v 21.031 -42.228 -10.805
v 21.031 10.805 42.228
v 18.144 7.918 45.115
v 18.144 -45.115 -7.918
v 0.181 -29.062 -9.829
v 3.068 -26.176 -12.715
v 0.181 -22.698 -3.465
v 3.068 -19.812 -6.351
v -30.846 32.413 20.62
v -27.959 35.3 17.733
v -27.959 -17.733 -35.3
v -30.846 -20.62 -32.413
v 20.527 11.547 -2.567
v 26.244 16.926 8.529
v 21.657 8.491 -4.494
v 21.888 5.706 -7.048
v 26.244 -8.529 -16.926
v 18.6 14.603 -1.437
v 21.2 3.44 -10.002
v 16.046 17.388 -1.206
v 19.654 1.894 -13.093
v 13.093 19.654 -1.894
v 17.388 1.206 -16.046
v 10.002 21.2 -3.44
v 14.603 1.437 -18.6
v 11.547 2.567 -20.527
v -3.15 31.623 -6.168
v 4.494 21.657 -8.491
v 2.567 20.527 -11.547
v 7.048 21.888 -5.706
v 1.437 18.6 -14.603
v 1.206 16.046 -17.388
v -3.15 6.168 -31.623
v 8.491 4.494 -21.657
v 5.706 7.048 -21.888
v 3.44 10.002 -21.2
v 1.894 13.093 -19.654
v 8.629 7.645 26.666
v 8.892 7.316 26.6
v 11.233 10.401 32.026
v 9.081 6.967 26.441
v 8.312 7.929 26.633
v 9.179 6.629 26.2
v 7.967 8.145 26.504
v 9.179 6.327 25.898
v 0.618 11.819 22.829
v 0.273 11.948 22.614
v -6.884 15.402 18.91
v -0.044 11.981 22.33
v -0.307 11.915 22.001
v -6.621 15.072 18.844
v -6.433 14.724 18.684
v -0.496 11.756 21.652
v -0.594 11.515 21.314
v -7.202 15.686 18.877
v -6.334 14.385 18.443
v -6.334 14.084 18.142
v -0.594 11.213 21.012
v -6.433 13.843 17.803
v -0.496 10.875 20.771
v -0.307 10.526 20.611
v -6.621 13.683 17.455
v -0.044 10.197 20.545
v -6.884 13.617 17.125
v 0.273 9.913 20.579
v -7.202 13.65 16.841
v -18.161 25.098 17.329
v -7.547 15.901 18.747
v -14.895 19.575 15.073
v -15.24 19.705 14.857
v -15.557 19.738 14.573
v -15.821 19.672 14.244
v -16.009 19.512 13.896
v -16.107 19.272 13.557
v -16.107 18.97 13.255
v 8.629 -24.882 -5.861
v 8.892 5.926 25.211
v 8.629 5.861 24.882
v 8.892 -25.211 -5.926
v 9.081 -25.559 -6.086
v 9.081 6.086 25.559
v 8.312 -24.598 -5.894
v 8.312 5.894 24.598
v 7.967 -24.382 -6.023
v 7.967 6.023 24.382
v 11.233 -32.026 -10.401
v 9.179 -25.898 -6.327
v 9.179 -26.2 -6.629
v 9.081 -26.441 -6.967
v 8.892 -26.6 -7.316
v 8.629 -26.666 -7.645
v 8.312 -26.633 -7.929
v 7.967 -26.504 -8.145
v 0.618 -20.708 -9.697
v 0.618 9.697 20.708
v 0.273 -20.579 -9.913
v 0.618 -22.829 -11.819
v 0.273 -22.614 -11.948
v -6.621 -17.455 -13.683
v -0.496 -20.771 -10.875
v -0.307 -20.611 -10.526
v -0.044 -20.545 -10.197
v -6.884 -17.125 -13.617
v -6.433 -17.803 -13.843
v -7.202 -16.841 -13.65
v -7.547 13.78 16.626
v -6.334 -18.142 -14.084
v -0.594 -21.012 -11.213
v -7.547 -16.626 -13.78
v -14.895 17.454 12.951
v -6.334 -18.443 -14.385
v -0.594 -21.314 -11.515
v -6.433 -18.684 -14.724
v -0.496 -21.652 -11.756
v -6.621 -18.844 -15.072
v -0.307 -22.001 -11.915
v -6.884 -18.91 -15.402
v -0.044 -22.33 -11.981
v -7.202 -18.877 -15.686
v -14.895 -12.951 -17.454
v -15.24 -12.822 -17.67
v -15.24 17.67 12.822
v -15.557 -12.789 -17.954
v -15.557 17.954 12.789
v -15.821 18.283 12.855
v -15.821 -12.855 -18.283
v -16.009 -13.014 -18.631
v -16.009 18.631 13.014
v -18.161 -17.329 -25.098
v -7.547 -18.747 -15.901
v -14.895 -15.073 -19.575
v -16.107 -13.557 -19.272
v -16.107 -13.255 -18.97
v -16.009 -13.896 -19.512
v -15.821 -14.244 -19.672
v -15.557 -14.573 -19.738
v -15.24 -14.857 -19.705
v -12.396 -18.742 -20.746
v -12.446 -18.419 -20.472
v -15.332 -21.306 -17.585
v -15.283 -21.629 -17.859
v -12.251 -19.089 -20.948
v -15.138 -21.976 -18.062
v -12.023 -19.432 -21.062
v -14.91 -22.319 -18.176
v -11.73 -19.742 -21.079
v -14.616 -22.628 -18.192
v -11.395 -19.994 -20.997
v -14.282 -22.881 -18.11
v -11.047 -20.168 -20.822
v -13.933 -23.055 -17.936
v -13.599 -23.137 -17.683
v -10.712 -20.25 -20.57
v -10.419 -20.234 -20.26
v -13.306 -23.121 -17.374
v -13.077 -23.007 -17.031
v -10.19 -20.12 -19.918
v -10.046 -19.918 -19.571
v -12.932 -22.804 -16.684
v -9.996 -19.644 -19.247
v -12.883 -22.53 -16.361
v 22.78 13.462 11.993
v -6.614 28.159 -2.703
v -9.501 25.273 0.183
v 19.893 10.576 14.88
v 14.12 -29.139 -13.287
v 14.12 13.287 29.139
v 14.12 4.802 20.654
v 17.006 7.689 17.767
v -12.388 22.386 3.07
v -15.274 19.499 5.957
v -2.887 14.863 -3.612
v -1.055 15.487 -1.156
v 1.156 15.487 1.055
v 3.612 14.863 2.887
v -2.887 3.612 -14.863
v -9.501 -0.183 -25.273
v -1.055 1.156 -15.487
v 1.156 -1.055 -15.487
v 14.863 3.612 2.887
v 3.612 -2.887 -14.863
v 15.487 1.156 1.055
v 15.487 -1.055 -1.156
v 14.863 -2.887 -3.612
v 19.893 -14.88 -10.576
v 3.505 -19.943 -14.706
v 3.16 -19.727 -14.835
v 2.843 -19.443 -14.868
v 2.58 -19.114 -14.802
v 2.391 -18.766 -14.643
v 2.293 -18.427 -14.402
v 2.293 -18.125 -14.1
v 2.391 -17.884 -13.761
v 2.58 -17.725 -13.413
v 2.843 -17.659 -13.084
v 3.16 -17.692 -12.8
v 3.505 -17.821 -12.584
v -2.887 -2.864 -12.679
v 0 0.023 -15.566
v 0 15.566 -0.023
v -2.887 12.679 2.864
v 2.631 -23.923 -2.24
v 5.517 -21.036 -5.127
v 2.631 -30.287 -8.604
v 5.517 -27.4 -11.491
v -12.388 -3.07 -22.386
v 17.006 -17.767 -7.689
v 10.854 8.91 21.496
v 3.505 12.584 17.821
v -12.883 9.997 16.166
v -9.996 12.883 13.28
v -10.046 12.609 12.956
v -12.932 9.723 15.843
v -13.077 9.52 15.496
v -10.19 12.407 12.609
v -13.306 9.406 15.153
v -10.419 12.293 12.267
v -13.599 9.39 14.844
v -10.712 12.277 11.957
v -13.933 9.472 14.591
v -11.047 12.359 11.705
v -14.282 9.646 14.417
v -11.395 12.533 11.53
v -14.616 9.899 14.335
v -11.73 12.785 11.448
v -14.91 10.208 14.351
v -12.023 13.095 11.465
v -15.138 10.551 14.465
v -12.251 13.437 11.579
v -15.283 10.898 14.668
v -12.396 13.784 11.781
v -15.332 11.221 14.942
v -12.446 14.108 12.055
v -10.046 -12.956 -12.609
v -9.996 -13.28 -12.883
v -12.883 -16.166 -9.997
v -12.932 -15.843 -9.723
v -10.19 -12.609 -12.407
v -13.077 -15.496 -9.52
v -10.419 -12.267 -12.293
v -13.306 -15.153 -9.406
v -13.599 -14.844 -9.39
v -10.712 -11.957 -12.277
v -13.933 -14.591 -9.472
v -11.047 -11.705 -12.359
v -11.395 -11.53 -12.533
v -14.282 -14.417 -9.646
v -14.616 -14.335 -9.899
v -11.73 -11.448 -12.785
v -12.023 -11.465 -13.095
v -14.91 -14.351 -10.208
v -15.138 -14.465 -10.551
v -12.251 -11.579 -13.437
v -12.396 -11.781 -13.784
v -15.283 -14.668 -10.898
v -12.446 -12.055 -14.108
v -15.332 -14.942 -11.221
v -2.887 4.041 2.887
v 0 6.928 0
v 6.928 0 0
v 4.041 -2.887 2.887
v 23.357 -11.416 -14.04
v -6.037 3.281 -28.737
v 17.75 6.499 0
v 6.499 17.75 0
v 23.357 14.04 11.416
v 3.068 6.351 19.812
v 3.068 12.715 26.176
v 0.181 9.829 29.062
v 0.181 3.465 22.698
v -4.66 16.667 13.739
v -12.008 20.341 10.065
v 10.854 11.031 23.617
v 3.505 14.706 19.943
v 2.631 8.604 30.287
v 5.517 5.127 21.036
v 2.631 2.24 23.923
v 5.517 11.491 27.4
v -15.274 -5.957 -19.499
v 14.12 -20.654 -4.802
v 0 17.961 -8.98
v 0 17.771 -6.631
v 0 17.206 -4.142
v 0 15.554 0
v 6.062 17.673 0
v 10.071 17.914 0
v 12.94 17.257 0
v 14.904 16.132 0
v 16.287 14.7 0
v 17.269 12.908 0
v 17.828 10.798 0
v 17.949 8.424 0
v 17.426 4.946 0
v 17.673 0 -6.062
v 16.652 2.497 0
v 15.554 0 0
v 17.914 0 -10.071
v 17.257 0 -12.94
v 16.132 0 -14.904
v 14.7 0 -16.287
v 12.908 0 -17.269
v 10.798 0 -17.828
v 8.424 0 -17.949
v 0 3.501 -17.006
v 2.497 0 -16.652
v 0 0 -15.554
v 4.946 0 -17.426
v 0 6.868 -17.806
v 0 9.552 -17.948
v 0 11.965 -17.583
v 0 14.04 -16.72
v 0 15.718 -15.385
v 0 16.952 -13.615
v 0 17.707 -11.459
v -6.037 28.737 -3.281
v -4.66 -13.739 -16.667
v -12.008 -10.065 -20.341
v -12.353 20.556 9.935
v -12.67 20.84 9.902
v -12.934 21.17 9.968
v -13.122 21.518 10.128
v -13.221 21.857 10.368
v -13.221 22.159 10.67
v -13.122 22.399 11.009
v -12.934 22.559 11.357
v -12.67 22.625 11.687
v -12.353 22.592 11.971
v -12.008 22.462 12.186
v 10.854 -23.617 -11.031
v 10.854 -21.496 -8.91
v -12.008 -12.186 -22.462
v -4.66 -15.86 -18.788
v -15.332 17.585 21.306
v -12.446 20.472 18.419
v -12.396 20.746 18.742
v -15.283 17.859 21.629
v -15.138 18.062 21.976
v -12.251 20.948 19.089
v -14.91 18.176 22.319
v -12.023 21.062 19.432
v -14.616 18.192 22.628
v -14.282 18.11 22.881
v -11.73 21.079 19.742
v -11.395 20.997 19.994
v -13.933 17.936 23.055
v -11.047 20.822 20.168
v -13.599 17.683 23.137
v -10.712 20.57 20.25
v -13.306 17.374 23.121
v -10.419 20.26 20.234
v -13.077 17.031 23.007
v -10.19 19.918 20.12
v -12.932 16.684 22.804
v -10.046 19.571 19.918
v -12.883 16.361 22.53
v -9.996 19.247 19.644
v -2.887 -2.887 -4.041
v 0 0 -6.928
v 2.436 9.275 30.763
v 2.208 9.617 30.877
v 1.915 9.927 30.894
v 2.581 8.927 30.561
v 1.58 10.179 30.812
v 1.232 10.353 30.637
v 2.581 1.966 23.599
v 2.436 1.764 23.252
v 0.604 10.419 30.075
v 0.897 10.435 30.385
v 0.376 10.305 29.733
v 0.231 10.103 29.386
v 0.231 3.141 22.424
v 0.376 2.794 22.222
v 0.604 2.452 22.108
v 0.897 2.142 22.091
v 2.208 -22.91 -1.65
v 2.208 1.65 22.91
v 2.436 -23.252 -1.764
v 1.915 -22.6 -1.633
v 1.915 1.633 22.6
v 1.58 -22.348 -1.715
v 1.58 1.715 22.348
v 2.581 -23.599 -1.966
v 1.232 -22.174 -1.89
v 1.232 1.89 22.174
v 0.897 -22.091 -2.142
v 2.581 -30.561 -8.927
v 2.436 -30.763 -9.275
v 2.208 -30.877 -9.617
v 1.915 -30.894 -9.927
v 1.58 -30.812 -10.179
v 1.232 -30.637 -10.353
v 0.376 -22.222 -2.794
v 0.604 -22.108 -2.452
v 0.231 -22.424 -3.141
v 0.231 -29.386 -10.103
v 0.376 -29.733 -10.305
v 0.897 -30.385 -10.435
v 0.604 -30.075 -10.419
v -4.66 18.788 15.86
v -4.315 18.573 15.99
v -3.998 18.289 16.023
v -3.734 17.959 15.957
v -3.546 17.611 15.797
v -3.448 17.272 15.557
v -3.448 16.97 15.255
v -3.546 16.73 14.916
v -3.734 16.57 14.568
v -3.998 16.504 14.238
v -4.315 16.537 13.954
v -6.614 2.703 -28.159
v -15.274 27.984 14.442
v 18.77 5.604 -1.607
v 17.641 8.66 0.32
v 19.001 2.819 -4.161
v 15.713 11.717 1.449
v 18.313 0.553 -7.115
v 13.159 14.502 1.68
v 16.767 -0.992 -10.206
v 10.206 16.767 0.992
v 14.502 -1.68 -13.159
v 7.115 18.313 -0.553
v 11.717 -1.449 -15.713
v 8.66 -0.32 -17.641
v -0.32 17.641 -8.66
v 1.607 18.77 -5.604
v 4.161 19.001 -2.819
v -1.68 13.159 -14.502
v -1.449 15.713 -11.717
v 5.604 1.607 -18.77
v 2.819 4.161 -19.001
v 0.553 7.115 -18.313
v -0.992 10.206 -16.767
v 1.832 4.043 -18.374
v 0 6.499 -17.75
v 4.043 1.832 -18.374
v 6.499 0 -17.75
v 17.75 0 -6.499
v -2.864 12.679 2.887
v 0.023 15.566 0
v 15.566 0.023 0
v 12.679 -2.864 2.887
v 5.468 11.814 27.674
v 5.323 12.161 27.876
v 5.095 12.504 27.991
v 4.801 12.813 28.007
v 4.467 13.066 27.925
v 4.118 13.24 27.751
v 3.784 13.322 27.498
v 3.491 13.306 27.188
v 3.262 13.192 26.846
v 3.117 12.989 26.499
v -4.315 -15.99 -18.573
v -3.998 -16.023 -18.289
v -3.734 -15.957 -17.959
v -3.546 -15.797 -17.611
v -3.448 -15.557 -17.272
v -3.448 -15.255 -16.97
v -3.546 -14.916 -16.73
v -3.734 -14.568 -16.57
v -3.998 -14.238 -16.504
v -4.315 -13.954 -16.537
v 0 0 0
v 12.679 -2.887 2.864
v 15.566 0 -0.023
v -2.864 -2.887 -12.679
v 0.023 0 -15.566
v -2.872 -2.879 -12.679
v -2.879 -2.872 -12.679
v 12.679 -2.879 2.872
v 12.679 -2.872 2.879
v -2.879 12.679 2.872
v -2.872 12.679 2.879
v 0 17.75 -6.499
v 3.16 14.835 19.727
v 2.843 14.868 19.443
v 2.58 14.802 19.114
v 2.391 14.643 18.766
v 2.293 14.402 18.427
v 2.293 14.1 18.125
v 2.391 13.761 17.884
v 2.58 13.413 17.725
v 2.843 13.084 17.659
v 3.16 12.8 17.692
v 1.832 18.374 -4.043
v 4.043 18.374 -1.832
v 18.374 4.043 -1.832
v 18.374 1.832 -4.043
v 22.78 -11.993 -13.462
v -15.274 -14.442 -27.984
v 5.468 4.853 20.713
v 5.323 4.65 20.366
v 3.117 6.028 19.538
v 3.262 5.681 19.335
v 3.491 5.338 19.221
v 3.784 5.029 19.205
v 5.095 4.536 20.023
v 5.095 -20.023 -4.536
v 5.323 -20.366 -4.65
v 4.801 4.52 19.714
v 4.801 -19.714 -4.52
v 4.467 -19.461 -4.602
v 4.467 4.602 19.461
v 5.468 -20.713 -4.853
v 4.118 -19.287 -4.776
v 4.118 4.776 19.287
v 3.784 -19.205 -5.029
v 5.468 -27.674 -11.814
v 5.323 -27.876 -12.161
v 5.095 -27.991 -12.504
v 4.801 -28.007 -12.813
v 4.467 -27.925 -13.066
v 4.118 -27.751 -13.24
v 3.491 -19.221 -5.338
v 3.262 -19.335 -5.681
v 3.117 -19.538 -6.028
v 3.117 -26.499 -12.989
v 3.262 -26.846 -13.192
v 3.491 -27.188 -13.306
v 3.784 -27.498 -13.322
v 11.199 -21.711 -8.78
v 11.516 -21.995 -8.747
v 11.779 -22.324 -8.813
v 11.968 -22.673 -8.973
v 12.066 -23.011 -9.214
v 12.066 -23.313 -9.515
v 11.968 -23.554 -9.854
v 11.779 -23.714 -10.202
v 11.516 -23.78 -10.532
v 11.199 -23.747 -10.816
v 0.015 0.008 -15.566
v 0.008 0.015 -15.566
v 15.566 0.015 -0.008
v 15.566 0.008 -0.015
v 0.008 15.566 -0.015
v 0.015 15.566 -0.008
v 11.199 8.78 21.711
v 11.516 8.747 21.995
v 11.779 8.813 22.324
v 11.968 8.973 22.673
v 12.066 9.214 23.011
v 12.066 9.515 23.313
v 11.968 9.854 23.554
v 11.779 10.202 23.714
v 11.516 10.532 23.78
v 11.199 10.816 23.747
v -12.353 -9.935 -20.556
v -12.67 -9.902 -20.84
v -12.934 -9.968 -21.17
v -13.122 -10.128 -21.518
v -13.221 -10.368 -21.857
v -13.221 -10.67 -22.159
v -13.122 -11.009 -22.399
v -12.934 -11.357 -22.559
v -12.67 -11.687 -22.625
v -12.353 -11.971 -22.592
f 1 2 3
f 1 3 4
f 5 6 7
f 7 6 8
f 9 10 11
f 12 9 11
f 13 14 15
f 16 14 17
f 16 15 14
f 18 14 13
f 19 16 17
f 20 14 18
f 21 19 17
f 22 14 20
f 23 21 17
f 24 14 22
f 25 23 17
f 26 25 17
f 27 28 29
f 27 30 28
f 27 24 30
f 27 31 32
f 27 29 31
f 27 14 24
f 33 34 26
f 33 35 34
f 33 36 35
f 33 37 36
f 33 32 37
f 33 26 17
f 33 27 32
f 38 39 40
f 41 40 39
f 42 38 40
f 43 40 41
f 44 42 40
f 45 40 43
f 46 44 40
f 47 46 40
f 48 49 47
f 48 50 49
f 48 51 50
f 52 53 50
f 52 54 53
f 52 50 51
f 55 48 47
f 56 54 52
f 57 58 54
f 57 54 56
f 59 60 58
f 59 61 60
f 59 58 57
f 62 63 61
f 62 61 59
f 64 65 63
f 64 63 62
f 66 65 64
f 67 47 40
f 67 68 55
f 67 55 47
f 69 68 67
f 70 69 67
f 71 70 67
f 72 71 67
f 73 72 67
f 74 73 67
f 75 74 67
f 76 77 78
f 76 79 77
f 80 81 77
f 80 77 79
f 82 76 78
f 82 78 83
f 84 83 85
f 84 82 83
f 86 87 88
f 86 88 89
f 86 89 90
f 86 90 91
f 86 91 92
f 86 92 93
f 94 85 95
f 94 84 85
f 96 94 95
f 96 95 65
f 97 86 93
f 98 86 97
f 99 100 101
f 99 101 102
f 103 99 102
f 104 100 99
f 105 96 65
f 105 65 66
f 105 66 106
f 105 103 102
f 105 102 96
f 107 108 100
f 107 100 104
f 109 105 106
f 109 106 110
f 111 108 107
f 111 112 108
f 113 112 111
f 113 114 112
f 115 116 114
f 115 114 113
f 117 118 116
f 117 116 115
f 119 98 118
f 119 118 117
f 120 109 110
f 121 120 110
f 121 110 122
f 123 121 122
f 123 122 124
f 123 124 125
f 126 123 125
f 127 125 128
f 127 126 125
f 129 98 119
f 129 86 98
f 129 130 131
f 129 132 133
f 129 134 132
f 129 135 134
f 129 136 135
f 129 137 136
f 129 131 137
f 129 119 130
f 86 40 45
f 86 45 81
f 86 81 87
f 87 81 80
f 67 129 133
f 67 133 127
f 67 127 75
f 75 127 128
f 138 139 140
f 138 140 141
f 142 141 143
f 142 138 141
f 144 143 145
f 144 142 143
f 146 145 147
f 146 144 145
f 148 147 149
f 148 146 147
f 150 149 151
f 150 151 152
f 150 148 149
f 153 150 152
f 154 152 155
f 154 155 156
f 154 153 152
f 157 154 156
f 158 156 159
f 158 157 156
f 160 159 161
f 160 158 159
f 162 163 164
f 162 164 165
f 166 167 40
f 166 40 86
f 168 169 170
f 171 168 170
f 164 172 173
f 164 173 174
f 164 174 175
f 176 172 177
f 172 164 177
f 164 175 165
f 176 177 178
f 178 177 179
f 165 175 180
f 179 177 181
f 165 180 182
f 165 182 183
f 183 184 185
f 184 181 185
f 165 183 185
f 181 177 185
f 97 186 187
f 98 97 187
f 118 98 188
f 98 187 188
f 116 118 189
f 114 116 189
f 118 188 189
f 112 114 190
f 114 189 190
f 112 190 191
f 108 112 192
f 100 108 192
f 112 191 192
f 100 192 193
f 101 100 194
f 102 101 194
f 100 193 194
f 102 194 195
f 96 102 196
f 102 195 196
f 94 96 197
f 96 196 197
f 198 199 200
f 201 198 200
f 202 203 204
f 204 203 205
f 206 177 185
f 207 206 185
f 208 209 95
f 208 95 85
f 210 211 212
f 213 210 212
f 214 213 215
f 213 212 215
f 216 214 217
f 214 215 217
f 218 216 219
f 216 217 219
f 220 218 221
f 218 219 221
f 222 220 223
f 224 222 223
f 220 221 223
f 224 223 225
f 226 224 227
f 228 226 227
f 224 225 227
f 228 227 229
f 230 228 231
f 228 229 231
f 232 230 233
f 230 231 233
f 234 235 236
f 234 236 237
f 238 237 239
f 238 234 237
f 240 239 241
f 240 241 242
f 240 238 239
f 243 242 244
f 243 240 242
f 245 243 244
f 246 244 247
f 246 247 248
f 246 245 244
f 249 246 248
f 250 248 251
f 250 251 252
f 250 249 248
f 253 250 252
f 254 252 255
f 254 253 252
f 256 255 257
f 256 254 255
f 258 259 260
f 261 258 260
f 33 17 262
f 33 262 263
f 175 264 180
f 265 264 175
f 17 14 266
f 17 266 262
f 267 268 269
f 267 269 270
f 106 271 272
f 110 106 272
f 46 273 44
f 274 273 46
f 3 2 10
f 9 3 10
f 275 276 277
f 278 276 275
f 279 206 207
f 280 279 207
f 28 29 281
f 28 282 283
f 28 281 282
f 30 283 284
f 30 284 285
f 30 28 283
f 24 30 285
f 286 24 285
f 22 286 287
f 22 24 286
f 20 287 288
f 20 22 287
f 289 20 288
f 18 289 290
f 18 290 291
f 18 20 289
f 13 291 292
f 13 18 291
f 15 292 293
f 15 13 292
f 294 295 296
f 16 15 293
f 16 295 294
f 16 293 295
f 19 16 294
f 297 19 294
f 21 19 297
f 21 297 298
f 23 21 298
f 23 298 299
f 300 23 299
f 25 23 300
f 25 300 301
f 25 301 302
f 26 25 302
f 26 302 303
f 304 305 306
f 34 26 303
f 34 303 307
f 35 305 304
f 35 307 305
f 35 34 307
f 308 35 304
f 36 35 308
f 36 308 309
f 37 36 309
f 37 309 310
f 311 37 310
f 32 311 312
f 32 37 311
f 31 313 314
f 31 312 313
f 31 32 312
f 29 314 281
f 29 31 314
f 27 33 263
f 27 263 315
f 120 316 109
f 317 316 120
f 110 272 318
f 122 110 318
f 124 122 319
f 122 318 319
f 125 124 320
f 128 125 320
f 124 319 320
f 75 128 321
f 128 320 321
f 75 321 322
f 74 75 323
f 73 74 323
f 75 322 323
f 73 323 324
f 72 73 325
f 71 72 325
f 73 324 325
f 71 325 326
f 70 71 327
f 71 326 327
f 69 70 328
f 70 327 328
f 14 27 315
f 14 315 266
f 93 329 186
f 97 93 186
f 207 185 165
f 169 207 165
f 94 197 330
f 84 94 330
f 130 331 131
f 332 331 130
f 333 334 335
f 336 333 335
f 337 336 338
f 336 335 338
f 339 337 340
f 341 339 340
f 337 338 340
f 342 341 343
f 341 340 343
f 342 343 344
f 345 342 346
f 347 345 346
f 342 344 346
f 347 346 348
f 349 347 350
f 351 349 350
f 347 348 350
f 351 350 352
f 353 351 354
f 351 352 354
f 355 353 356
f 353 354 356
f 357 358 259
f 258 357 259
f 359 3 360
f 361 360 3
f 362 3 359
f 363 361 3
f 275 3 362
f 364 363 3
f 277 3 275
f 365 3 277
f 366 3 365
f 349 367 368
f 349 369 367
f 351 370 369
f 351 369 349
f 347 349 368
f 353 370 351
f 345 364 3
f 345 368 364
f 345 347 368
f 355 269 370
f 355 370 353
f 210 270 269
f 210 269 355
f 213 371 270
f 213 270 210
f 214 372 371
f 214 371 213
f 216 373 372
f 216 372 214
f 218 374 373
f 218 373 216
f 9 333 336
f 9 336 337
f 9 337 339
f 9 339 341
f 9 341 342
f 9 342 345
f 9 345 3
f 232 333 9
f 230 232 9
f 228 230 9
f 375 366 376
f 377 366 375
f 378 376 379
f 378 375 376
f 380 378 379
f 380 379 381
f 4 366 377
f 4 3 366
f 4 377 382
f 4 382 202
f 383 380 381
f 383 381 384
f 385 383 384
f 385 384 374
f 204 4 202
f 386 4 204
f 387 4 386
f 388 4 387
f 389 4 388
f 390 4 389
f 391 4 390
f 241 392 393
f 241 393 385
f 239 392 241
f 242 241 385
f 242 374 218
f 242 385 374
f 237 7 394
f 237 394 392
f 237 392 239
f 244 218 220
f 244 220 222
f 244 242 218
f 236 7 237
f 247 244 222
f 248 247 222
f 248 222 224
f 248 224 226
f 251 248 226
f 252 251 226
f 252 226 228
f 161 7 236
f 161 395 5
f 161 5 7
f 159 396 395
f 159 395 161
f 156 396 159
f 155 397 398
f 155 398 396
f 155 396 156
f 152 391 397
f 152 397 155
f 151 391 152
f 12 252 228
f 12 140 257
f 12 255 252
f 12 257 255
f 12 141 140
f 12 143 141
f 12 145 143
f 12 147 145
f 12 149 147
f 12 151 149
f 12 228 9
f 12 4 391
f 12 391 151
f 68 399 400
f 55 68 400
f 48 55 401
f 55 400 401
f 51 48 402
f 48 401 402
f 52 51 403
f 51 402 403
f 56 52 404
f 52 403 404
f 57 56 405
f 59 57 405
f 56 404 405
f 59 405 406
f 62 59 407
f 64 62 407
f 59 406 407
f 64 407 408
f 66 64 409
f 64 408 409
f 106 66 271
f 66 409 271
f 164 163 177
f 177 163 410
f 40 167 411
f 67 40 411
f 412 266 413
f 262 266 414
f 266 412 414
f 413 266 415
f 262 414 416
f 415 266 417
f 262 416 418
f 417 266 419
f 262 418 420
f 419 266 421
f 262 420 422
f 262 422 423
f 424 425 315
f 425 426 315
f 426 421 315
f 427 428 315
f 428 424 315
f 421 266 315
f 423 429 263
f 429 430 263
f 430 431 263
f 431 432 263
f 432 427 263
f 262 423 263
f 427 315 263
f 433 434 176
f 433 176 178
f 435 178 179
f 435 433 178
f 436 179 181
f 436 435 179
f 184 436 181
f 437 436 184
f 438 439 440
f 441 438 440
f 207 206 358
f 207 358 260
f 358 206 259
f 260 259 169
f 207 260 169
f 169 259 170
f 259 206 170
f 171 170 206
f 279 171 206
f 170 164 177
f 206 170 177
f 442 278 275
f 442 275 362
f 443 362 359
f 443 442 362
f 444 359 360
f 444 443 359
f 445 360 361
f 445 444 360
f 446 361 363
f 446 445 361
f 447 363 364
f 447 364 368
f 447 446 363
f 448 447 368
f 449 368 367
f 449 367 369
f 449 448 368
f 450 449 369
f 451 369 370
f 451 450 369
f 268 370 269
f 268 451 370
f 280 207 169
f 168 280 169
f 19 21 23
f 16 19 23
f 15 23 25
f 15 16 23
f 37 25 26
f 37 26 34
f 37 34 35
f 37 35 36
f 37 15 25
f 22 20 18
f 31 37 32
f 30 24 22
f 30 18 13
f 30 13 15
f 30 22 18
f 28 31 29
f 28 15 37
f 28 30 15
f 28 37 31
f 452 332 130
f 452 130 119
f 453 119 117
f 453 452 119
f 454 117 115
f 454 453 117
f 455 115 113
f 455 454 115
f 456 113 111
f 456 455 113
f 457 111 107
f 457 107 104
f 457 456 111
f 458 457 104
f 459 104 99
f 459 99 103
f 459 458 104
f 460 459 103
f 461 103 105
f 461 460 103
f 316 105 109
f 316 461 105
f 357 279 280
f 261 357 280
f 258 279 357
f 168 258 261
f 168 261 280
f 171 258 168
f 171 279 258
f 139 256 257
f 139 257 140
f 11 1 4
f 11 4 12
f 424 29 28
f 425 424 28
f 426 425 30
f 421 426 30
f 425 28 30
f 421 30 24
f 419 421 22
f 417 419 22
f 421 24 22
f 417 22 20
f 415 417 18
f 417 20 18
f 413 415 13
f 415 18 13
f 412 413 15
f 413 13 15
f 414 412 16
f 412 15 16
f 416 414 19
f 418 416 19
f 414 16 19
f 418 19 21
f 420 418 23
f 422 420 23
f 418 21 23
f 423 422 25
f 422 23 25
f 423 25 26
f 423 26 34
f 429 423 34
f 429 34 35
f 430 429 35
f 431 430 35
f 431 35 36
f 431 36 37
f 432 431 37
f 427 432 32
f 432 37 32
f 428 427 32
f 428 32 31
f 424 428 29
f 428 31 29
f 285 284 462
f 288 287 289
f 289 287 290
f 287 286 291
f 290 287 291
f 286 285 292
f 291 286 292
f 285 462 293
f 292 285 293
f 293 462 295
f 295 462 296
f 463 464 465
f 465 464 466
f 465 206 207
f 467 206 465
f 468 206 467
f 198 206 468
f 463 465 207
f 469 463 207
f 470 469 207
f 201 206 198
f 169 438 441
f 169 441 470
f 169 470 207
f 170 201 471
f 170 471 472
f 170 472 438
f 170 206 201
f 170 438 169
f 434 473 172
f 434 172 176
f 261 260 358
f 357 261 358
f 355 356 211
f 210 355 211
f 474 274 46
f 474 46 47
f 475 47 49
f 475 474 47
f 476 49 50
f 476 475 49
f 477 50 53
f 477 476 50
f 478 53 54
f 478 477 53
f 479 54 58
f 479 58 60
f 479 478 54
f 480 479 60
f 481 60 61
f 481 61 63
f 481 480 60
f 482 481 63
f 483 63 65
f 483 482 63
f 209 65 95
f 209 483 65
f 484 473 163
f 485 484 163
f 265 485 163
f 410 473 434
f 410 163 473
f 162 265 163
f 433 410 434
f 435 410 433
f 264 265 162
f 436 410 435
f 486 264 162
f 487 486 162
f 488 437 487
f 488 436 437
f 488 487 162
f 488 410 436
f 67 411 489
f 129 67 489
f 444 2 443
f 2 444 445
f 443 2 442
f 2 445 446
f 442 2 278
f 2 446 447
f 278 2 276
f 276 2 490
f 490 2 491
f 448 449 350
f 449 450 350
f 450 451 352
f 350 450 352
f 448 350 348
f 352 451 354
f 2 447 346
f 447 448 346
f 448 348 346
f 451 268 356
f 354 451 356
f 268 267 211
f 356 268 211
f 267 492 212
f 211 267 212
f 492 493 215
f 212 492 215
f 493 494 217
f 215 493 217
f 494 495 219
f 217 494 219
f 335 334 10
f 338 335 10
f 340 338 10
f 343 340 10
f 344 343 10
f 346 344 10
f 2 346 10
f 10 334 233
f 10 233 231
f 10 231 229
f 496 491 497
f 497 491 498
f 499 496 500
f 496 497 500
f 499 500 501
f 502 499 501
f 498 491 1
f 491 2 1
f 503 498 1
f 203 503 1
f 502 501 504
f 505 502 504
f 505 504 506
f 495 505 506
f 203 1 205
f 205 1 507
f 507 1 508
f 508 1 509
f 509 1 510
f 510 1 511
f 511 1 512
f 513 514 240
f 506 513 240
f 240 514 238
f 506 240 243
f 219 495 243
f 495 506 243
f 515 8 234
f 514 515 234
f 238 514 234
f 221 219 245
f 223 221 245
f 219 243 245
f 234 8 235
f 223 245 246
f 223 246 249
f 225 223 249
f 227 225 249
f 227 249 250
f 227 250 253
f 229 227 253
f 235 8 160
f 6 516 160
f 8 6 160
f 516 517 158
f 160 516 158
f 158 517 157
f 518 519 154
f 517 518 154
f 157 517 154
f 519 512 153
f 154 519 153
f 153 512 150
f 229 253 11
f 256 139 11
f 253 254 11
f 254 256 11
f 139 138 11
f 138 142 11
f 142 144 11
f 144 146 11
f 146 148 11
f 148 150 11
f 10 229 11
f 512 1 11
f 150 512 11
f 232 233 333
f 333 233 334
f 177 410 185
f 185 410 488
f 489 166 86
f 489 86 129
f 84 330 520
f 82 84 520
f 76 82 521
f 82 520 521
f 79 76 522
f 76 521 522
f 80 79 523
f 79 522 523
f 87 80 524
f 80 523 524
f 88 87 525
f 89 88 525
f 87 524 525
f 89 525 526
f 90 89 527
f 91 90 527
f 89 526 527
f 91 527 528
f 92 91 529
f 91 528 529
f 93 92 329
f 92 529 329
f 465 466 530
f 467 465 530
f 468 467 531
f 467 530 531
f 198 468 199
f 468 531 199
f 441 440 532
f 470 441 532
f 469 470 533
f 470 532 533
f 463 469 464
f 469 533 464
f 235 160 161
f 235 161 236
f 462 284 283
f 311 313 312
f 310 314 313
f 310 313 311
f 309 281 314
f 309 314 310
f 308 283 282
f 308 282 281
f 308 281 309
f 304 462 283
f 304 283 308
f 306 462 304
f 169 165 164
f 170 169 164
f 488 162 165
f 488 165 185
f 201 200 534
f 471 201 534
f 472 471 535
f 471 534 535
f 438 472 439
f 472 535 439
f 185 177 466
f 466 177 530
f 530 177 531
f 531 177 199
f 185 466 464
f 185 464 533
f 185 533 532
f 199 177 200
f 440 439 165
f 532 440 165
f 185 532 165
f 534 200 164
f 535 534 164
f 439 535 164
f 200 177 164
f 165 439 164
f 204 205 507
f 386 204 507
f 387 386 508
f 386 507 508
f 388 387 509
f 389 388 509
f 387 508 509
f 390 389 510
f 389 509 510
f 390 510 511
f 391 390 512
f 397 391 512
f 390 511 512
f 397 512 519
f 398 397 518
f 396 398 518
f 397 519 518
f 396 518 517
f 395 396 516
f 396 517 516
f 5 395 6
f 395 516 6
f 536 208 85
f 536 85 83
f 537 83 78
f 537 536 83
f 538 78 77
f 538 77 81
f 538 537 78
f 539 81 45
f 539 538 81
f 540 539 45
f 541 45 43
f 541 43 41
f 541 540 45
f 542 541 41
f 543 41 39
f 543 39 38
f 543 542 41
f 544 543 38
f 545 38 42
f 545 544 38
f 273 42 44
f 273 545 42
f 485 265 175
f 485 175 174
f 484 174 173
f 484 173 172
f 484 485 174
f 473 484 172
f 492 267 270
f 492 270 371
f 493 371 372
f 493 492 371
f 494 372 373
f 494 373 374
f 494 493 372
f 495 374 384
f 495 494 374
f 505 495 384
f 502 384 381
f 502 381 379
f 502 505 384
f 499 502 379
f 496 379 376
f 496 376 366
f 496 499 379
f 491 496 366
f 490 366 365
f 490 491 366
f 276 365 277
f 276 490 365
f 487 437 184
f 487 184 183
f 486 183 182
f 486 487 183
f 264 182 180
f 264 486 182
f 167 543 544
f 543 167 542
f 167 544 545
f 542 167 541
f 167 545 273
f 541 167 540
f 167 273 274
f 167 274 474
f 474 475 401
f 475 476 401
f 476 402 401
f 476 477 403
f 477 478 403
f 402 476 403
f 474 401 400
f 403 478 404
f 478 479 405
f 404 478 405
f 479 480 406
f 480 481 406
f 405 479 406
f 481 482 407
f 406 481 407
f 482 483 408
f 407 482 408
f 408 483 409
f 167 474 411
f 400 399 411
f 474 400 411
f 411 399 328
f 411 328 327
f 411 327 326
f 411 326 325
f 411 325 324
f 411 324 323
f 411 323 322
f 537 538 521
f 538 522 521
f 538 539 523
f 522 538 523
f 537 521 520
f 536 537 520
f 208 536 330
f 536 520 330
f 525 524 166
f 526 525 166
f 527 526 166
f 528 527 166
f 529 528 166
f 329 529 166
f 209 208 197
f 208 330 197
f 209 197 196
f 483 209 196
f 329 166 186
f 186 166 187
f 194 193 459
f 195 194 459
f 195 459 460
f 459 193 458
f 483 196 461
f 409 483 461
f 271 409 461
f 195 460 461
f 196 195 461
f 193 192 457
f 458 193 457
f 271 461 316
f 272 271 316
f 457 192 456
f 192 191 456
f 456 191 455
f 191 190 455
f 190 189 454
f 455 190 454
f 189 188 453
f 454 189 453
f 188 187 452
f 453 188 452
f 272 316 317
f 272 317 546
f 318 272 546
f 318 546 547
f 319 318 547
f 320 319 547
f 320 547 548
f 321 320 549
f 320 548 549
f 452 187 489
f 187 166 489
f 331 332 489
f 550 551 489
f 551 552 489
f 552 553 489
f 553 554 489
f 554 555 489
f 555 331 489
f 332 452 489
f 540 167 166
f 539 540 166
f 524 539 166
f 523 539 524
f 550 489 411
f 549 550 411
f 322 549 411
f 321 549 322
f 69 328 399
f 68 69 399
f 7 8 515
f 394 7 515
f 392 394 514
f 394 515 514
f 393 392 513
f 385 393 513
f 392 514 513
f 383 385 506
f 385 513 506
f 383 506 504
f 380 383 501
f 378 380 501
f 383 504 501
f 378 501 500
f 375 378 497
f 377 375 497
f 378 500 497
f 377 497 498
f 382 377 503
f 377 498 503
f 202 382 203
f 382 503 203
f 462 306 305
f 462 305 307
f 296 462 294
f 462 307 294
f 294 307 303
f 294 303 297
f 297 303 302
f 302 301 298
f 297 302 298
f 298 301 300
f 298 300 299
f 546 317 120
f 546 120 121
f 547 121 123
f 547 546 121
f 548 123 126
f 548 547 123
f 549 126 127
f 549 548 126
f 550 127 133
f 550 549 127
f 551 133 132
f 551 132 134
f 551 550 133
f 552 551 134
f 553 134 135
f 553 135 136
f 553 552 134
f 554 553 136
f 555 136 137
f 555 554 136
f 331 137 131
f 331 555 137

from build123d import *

# Parameters (mm, degrees)
SKETCH1_W           = 80
SKETCH1_H           = 80
BOSS_EXTRUDE1_DEPTH = 80
SKETCH2_R           = 97.950709898
CUT_EXTRUDE1_DEPTH  = 93.37604307
SKETCH3_R           = 78.302577254
SKETCH3_R_2         = 12.7
CUT_EXTRUDE2_DEPTH  = 40
SKETCH4_R           = 14.105721121
CUT_EXTRUDE3_DEPTH  = 40
SKETCH6_W           = 36
SKETCH6_H           = 36
BOSS_EXTRUDE2_DEPTH = 5
BOSS_EXTRUDE3_DEPTH = 5
BOSS_EXTRUDE4_DEPTH = 5
SKETCH12_R          = 12.7
BOSS_EXTRUDE6_DEPTH = 5
SKETCH15_W          = 36
SKETCH15_H          = 60
BOSS_EXTRUDE8_DEPTH = 5
SKETCH16_W          = 60
SKETCH16_H          = 75
BOSS_EXTRUDE9_DEPTH = 5


with BuildPart() as part:
    # Sketch1 → Boss-Extrude1 (new body)
    with BuildSketch(Plane(origin=(0, 0, 0), x_dir=(1, 0, 0), z_dir=(0, 1, 0))):
        with Locations((40, 40)):
            Rectangle(SKETCH1_W, SKETCH1_H)
    extrude(amount=BOSS_EXTRUDE1_DEPTH)

    # Sketch2 → Cut-Extrude1 (cut, through all)
    with BuildSketch(Plane(origin=(26.666666667, 26.666666667, -26.666666667), x_dir=(-0.8164965809277261, 0.408248290463863, -0.408248290463863), z_dir=(0.5773502691896257, 0.5773502691896258, -0.5773502691896258))):
        Circle(SKETCH2_R)
    extrude(amount=CUT_EXTRUDE1_DEPTH, mode=Mode.SUBTRACT)

    # Sketch3 → Cut-Extrude2 (cut)
    with BuildSketch(Plane(origin=(26.666666667, 26.666666667, -26.666666667), x_dir=(-0.4082482904638628, -0.408248290463863, -0.8164965809277263), z_dir=(0.5773502691896258, 0.577350269189626, -0.5773502691896256))):
        Circle(SKETCH3_R)
        with Locations(Location((0, 0, 0), (0, 0, 90))):
            Circle(SKETCH3_R_2, mode=Mode.SUBTRACT)
    extrude(amount=-CUT_EXTRUDE2_DEPTH, mode=Mode.SUBTRACT)

    # Sketch4 → Cut-Extrude3 (cut)
    with BuildSketch(Plane(origin=(11.547005384, 11.547005384, -11.547005384), x_dir=(-0.816496580927726, 0.408248290463863, -0.408248290463863), z_dir=(0.5773502691896258, 0.5773502691896262, -0.5773502691896255))):
        Circle(SKETCH4_R)
    extrude(amount=CUT_EXTRUDE3_DEPTH, mode=Mode.SUBTRACT)


with BuildPart() as body_2:
    # Sketch6 → Boss-Extrude2 (new body)
    with BuildSketch(Plane(origin=(8.082903769, 8.082903769, -8.082903769), x_dir=(0.8164965809277259, -0.4082482904638634, 0.40824829046386296), z_dir=(0.577350269189626, 0.5773502691896261, -0.5773502691896253))):
        Rectangle(SKETCH6_W, SKETCH6_H)
        with BuildLine():
            Line((11.839413643, -4.595463479), (-1.939918706, -12.55096472))
            ThreePointArc((-1.939918706, -12.55096472), (-6.35, -10.998522628), (-9.899494937, -7.955501241))
            Line((-9.899494937, -7.955501241), (-9.899494937, 7.955501241))
            ThreePointArc((-9.899494937, 7.955501241), (-6.35, 10.998522628), (-1.939918706, 12.55096472))
            Line((-1.939918706, 12.55096472), (11.839413643, 4.595463479))
            ThreePointArc((11.839413643, 4.595463479), (12.7, 0), (11.839413643, -4.595463479))
        make_face(mode=Mode.SUBTRACT)
    extrude(amount=-BOSS_EXTRUDE2_DEPTH)


with BuildPart() as body_3:
    # Sketch7 → Boss-Extrude3 (new body)
    with BuildSketch(Plane(origin=(5.196152423, 5.196152423, -5.196152423), x_dir=(0.4082482904638628, 0.40824829046386274, 0.8164965809277264), z_dir=(-0.5773502691896258, -0.5773502691896261, 0.5773502691896254))):
        Polygon((6.588457268, 24.588457268), (-24.588457268, 6.588457268), (-6.588457268, -24.588457268), (24.588457268, -6.588457268), align=None)
        with BuildLine():
            Line((6.363961031, 10.9904504), (6.363961031, -10.9904504))
            ThreePointArc((6.363961031, -10.9904504), (6.35, -10.998522628), (6.33602873, -11.006577121))
            Line((6.33602873, -11.006577121), (-12.699989761, -0.016126721))
            ThreePointArc((-12.699989761, -0.016126721), (-12.7, 0), (-12.699989761, 0.016126721))
            Line((-12.699989761, 0.016126721), (6.33602873, 11.006577121))
            ThreePointArc((6.33602873, 11.006577121), (6.35, 10.998522628), (6.363961031, 10.9904504))
        make_face(mode=Mode.SUBTRACT)
    extrude(amount=BOSS_EXTRUDE3_DEPTH)


with BuildPart() as body_4:
    # Sketch8 → Boss-Extrude4 (new body)
    with BuildSketch(Plane(origin=(2.309401077, 2.309401077, -2.309401077), x_dir=(0.40824829046386274, 0.4082482904638628, 0.8164965809277264), z_dir=(-0.5773502691896258, -0.5773502691896261, 0.5773502691896254))):
        Polygon((24.588457268, -6.588457268), (6.588457268, 24.588457268), (-24.588457268, 6.588457268), (-6.588457268, -24.588457268), align=None)
        Polygon((-5.656854249, 0), (2.828427125, 4.898979486), (2.828427125, -4.898979486), align=None, mode=Mode.SUBTRACT)
    extrude(amount=BOSS_EXTRUDE4_DEPTH)


with BuildPart() as body_5:
    # Sketch12 → Boss-Extrude6 (new body)
    with BuildSketch(Plane(origin=(11.547005384, 11.547005384, -11.547005384), x_dir=(-0.4082482904638629, -0.40824829046386285, -0.8164965809277264), z_dir=(0.577350269189626, 0.577350269189626, -0.5773502691896255))):
        Polygon((24.588457268, 6.588457268), (-6.588457268, 24.588457268), (-24.588457268, -6.588457268), (6.588457268, -24.588457268), align=None)
        with Locations(Location((0, 0, 0), (0, 0, 90))):
            Circle(SKETCH12_R, mode=Mode.SUBTRACT)
    extrude(amount=-BOSS_EXTRUDE6_DEPTH)


with BuildPart() as body_6:
    # Sketch15 → Boss-Extrude8 (new body)
    with BuildSketch(Plane(origin=(-0.577350269189621, -0.5773502691896211, 0.5773502691896204), x_dir=(-0.8164965809277259, 0.4082482904638634, -0.4082482904638631), z_dir=(-0.5773502691896261, -0.5773502691896256, 0.5773502691896257))):
        Rectangle(SKETCH15_W, SKETCH15_H)
        with BuildLine():
            Line((-14, 24.5), (-5, 24.5))
            ThreePointArc((-5, 24.5), (-3.5, 23), (-5, 21.5))
            Line((-5, 21.5), (-14, 21.5))
            ThreePointArc((-14, 21.5), (-15.5, 23), (-14, 24.5))
        make_face(mode=Mode.SUBTRACT)
        with BuildLine():
            Line((14, 24.5), (5, 24.5))
            ThreePointArc((5, 24.5), (3.5, 23), (5, 21.5))
            Line((5, 21.5), (14, 21.5))
            ThreePointArc((14, 21.5), (15.5, 23), (14, 24.5))
        make_face(mode=Mode.SUBTRACT)
        with BuildLine():
            Line((14, -24.5), (5, -24.5))
            ThreePointArc((5, -24.5), (3.5, -23), (5, -21.5))
            Line((5, -21.5), (14, -21.5))
            ThreePointArc((14, -21.5), (15.5, -23), (14, -24.5))
        make_face(mode=Mode.SUBTRACT)
        with BuildLine():
            Line((-14, -24.5), (-5, -24.5))
            ThreePointArc((-5, -24.5), (-3.5, -23), (-5, -21.5))
            Line((-5, -21.5), (-14, -21.5))
            ThreePointArc((-14, -21.5), (-15.5, -23), (-14, -24.5))
        make_face(mode=Mode.SUBTRACT)
    extrude(amount=BOSS_EXTRUDE8_DEPTH)


with BuildPart() as body_7:
    # Sketch16 → Boss-Extrude9 (new body)
    with BuildSketch(Plane(origin=(-3.464101615, -3.464101615, 3.464101615), x_dir=(-0.8164965809277259, 0.4082482904638634, -0.4082482904638631), z_dir=(-0.5773502691896261, -0.5773502691896256, 0.5773502691896257))):
        Rectangle(SKETCH16_W, SKETCH16_H)
        with BuildLine():
            Line((-11, 18.5), (-11, 27.5))
            ThreePointArc((-11, 27.5), (-9.5, 29), (-8, 27.5))
            Line((-8, 27.5), (-8, 18.5))
            ThreePointArc((-8, 18.5), (-9.5, 17), (-11, 18.5))
        make_face(mode=Mode.SUBTRACT)
        with BuildLine():
            Line((11, 18.5), (11, 27.5))
            ThreePointArc((11, 27.5), (9.5, 29), (8, 27.5))
            Line((8, 27.5), (8, 18.5))
            ThreePointArc((8, 18.5), (9.5, 17), (11, 18.5))
        make_face(mode=Mode.SUBTRACT)
        with BuildLine():
            Line((-11, -18.5), (-11, -27.5))
            ThreePointArc((-11, -27.5), (-9.5, -29), (-8, -27.5))
            Line((-8, -27.5), (-8, -18.5))
            ThreePointArc((-8, -18.5), (-9.5, -17), (-11, -18.5))
        make_face(mode=Mode.SUBTRACT)
        with BuildLine():
            Line((8, -27.5), (8, -18.5))
            ThreePointArc((8, -18.5), (9.5, -17), (11, -18.5))
            Line((11, -18.5), (11, -27.5))
            ThreePointArc((11, -27.5), (9.5, -29), (8, -27.5))
        make_face(mode=Mode.SUBTRACT)
    extrude(amount=BOSS_EXTRUDE9_DEPTH)


solid = Compound([part.part, body_2.part, body_3.part, body_4.part, body_5.part, body_6.part, body_7.part])
